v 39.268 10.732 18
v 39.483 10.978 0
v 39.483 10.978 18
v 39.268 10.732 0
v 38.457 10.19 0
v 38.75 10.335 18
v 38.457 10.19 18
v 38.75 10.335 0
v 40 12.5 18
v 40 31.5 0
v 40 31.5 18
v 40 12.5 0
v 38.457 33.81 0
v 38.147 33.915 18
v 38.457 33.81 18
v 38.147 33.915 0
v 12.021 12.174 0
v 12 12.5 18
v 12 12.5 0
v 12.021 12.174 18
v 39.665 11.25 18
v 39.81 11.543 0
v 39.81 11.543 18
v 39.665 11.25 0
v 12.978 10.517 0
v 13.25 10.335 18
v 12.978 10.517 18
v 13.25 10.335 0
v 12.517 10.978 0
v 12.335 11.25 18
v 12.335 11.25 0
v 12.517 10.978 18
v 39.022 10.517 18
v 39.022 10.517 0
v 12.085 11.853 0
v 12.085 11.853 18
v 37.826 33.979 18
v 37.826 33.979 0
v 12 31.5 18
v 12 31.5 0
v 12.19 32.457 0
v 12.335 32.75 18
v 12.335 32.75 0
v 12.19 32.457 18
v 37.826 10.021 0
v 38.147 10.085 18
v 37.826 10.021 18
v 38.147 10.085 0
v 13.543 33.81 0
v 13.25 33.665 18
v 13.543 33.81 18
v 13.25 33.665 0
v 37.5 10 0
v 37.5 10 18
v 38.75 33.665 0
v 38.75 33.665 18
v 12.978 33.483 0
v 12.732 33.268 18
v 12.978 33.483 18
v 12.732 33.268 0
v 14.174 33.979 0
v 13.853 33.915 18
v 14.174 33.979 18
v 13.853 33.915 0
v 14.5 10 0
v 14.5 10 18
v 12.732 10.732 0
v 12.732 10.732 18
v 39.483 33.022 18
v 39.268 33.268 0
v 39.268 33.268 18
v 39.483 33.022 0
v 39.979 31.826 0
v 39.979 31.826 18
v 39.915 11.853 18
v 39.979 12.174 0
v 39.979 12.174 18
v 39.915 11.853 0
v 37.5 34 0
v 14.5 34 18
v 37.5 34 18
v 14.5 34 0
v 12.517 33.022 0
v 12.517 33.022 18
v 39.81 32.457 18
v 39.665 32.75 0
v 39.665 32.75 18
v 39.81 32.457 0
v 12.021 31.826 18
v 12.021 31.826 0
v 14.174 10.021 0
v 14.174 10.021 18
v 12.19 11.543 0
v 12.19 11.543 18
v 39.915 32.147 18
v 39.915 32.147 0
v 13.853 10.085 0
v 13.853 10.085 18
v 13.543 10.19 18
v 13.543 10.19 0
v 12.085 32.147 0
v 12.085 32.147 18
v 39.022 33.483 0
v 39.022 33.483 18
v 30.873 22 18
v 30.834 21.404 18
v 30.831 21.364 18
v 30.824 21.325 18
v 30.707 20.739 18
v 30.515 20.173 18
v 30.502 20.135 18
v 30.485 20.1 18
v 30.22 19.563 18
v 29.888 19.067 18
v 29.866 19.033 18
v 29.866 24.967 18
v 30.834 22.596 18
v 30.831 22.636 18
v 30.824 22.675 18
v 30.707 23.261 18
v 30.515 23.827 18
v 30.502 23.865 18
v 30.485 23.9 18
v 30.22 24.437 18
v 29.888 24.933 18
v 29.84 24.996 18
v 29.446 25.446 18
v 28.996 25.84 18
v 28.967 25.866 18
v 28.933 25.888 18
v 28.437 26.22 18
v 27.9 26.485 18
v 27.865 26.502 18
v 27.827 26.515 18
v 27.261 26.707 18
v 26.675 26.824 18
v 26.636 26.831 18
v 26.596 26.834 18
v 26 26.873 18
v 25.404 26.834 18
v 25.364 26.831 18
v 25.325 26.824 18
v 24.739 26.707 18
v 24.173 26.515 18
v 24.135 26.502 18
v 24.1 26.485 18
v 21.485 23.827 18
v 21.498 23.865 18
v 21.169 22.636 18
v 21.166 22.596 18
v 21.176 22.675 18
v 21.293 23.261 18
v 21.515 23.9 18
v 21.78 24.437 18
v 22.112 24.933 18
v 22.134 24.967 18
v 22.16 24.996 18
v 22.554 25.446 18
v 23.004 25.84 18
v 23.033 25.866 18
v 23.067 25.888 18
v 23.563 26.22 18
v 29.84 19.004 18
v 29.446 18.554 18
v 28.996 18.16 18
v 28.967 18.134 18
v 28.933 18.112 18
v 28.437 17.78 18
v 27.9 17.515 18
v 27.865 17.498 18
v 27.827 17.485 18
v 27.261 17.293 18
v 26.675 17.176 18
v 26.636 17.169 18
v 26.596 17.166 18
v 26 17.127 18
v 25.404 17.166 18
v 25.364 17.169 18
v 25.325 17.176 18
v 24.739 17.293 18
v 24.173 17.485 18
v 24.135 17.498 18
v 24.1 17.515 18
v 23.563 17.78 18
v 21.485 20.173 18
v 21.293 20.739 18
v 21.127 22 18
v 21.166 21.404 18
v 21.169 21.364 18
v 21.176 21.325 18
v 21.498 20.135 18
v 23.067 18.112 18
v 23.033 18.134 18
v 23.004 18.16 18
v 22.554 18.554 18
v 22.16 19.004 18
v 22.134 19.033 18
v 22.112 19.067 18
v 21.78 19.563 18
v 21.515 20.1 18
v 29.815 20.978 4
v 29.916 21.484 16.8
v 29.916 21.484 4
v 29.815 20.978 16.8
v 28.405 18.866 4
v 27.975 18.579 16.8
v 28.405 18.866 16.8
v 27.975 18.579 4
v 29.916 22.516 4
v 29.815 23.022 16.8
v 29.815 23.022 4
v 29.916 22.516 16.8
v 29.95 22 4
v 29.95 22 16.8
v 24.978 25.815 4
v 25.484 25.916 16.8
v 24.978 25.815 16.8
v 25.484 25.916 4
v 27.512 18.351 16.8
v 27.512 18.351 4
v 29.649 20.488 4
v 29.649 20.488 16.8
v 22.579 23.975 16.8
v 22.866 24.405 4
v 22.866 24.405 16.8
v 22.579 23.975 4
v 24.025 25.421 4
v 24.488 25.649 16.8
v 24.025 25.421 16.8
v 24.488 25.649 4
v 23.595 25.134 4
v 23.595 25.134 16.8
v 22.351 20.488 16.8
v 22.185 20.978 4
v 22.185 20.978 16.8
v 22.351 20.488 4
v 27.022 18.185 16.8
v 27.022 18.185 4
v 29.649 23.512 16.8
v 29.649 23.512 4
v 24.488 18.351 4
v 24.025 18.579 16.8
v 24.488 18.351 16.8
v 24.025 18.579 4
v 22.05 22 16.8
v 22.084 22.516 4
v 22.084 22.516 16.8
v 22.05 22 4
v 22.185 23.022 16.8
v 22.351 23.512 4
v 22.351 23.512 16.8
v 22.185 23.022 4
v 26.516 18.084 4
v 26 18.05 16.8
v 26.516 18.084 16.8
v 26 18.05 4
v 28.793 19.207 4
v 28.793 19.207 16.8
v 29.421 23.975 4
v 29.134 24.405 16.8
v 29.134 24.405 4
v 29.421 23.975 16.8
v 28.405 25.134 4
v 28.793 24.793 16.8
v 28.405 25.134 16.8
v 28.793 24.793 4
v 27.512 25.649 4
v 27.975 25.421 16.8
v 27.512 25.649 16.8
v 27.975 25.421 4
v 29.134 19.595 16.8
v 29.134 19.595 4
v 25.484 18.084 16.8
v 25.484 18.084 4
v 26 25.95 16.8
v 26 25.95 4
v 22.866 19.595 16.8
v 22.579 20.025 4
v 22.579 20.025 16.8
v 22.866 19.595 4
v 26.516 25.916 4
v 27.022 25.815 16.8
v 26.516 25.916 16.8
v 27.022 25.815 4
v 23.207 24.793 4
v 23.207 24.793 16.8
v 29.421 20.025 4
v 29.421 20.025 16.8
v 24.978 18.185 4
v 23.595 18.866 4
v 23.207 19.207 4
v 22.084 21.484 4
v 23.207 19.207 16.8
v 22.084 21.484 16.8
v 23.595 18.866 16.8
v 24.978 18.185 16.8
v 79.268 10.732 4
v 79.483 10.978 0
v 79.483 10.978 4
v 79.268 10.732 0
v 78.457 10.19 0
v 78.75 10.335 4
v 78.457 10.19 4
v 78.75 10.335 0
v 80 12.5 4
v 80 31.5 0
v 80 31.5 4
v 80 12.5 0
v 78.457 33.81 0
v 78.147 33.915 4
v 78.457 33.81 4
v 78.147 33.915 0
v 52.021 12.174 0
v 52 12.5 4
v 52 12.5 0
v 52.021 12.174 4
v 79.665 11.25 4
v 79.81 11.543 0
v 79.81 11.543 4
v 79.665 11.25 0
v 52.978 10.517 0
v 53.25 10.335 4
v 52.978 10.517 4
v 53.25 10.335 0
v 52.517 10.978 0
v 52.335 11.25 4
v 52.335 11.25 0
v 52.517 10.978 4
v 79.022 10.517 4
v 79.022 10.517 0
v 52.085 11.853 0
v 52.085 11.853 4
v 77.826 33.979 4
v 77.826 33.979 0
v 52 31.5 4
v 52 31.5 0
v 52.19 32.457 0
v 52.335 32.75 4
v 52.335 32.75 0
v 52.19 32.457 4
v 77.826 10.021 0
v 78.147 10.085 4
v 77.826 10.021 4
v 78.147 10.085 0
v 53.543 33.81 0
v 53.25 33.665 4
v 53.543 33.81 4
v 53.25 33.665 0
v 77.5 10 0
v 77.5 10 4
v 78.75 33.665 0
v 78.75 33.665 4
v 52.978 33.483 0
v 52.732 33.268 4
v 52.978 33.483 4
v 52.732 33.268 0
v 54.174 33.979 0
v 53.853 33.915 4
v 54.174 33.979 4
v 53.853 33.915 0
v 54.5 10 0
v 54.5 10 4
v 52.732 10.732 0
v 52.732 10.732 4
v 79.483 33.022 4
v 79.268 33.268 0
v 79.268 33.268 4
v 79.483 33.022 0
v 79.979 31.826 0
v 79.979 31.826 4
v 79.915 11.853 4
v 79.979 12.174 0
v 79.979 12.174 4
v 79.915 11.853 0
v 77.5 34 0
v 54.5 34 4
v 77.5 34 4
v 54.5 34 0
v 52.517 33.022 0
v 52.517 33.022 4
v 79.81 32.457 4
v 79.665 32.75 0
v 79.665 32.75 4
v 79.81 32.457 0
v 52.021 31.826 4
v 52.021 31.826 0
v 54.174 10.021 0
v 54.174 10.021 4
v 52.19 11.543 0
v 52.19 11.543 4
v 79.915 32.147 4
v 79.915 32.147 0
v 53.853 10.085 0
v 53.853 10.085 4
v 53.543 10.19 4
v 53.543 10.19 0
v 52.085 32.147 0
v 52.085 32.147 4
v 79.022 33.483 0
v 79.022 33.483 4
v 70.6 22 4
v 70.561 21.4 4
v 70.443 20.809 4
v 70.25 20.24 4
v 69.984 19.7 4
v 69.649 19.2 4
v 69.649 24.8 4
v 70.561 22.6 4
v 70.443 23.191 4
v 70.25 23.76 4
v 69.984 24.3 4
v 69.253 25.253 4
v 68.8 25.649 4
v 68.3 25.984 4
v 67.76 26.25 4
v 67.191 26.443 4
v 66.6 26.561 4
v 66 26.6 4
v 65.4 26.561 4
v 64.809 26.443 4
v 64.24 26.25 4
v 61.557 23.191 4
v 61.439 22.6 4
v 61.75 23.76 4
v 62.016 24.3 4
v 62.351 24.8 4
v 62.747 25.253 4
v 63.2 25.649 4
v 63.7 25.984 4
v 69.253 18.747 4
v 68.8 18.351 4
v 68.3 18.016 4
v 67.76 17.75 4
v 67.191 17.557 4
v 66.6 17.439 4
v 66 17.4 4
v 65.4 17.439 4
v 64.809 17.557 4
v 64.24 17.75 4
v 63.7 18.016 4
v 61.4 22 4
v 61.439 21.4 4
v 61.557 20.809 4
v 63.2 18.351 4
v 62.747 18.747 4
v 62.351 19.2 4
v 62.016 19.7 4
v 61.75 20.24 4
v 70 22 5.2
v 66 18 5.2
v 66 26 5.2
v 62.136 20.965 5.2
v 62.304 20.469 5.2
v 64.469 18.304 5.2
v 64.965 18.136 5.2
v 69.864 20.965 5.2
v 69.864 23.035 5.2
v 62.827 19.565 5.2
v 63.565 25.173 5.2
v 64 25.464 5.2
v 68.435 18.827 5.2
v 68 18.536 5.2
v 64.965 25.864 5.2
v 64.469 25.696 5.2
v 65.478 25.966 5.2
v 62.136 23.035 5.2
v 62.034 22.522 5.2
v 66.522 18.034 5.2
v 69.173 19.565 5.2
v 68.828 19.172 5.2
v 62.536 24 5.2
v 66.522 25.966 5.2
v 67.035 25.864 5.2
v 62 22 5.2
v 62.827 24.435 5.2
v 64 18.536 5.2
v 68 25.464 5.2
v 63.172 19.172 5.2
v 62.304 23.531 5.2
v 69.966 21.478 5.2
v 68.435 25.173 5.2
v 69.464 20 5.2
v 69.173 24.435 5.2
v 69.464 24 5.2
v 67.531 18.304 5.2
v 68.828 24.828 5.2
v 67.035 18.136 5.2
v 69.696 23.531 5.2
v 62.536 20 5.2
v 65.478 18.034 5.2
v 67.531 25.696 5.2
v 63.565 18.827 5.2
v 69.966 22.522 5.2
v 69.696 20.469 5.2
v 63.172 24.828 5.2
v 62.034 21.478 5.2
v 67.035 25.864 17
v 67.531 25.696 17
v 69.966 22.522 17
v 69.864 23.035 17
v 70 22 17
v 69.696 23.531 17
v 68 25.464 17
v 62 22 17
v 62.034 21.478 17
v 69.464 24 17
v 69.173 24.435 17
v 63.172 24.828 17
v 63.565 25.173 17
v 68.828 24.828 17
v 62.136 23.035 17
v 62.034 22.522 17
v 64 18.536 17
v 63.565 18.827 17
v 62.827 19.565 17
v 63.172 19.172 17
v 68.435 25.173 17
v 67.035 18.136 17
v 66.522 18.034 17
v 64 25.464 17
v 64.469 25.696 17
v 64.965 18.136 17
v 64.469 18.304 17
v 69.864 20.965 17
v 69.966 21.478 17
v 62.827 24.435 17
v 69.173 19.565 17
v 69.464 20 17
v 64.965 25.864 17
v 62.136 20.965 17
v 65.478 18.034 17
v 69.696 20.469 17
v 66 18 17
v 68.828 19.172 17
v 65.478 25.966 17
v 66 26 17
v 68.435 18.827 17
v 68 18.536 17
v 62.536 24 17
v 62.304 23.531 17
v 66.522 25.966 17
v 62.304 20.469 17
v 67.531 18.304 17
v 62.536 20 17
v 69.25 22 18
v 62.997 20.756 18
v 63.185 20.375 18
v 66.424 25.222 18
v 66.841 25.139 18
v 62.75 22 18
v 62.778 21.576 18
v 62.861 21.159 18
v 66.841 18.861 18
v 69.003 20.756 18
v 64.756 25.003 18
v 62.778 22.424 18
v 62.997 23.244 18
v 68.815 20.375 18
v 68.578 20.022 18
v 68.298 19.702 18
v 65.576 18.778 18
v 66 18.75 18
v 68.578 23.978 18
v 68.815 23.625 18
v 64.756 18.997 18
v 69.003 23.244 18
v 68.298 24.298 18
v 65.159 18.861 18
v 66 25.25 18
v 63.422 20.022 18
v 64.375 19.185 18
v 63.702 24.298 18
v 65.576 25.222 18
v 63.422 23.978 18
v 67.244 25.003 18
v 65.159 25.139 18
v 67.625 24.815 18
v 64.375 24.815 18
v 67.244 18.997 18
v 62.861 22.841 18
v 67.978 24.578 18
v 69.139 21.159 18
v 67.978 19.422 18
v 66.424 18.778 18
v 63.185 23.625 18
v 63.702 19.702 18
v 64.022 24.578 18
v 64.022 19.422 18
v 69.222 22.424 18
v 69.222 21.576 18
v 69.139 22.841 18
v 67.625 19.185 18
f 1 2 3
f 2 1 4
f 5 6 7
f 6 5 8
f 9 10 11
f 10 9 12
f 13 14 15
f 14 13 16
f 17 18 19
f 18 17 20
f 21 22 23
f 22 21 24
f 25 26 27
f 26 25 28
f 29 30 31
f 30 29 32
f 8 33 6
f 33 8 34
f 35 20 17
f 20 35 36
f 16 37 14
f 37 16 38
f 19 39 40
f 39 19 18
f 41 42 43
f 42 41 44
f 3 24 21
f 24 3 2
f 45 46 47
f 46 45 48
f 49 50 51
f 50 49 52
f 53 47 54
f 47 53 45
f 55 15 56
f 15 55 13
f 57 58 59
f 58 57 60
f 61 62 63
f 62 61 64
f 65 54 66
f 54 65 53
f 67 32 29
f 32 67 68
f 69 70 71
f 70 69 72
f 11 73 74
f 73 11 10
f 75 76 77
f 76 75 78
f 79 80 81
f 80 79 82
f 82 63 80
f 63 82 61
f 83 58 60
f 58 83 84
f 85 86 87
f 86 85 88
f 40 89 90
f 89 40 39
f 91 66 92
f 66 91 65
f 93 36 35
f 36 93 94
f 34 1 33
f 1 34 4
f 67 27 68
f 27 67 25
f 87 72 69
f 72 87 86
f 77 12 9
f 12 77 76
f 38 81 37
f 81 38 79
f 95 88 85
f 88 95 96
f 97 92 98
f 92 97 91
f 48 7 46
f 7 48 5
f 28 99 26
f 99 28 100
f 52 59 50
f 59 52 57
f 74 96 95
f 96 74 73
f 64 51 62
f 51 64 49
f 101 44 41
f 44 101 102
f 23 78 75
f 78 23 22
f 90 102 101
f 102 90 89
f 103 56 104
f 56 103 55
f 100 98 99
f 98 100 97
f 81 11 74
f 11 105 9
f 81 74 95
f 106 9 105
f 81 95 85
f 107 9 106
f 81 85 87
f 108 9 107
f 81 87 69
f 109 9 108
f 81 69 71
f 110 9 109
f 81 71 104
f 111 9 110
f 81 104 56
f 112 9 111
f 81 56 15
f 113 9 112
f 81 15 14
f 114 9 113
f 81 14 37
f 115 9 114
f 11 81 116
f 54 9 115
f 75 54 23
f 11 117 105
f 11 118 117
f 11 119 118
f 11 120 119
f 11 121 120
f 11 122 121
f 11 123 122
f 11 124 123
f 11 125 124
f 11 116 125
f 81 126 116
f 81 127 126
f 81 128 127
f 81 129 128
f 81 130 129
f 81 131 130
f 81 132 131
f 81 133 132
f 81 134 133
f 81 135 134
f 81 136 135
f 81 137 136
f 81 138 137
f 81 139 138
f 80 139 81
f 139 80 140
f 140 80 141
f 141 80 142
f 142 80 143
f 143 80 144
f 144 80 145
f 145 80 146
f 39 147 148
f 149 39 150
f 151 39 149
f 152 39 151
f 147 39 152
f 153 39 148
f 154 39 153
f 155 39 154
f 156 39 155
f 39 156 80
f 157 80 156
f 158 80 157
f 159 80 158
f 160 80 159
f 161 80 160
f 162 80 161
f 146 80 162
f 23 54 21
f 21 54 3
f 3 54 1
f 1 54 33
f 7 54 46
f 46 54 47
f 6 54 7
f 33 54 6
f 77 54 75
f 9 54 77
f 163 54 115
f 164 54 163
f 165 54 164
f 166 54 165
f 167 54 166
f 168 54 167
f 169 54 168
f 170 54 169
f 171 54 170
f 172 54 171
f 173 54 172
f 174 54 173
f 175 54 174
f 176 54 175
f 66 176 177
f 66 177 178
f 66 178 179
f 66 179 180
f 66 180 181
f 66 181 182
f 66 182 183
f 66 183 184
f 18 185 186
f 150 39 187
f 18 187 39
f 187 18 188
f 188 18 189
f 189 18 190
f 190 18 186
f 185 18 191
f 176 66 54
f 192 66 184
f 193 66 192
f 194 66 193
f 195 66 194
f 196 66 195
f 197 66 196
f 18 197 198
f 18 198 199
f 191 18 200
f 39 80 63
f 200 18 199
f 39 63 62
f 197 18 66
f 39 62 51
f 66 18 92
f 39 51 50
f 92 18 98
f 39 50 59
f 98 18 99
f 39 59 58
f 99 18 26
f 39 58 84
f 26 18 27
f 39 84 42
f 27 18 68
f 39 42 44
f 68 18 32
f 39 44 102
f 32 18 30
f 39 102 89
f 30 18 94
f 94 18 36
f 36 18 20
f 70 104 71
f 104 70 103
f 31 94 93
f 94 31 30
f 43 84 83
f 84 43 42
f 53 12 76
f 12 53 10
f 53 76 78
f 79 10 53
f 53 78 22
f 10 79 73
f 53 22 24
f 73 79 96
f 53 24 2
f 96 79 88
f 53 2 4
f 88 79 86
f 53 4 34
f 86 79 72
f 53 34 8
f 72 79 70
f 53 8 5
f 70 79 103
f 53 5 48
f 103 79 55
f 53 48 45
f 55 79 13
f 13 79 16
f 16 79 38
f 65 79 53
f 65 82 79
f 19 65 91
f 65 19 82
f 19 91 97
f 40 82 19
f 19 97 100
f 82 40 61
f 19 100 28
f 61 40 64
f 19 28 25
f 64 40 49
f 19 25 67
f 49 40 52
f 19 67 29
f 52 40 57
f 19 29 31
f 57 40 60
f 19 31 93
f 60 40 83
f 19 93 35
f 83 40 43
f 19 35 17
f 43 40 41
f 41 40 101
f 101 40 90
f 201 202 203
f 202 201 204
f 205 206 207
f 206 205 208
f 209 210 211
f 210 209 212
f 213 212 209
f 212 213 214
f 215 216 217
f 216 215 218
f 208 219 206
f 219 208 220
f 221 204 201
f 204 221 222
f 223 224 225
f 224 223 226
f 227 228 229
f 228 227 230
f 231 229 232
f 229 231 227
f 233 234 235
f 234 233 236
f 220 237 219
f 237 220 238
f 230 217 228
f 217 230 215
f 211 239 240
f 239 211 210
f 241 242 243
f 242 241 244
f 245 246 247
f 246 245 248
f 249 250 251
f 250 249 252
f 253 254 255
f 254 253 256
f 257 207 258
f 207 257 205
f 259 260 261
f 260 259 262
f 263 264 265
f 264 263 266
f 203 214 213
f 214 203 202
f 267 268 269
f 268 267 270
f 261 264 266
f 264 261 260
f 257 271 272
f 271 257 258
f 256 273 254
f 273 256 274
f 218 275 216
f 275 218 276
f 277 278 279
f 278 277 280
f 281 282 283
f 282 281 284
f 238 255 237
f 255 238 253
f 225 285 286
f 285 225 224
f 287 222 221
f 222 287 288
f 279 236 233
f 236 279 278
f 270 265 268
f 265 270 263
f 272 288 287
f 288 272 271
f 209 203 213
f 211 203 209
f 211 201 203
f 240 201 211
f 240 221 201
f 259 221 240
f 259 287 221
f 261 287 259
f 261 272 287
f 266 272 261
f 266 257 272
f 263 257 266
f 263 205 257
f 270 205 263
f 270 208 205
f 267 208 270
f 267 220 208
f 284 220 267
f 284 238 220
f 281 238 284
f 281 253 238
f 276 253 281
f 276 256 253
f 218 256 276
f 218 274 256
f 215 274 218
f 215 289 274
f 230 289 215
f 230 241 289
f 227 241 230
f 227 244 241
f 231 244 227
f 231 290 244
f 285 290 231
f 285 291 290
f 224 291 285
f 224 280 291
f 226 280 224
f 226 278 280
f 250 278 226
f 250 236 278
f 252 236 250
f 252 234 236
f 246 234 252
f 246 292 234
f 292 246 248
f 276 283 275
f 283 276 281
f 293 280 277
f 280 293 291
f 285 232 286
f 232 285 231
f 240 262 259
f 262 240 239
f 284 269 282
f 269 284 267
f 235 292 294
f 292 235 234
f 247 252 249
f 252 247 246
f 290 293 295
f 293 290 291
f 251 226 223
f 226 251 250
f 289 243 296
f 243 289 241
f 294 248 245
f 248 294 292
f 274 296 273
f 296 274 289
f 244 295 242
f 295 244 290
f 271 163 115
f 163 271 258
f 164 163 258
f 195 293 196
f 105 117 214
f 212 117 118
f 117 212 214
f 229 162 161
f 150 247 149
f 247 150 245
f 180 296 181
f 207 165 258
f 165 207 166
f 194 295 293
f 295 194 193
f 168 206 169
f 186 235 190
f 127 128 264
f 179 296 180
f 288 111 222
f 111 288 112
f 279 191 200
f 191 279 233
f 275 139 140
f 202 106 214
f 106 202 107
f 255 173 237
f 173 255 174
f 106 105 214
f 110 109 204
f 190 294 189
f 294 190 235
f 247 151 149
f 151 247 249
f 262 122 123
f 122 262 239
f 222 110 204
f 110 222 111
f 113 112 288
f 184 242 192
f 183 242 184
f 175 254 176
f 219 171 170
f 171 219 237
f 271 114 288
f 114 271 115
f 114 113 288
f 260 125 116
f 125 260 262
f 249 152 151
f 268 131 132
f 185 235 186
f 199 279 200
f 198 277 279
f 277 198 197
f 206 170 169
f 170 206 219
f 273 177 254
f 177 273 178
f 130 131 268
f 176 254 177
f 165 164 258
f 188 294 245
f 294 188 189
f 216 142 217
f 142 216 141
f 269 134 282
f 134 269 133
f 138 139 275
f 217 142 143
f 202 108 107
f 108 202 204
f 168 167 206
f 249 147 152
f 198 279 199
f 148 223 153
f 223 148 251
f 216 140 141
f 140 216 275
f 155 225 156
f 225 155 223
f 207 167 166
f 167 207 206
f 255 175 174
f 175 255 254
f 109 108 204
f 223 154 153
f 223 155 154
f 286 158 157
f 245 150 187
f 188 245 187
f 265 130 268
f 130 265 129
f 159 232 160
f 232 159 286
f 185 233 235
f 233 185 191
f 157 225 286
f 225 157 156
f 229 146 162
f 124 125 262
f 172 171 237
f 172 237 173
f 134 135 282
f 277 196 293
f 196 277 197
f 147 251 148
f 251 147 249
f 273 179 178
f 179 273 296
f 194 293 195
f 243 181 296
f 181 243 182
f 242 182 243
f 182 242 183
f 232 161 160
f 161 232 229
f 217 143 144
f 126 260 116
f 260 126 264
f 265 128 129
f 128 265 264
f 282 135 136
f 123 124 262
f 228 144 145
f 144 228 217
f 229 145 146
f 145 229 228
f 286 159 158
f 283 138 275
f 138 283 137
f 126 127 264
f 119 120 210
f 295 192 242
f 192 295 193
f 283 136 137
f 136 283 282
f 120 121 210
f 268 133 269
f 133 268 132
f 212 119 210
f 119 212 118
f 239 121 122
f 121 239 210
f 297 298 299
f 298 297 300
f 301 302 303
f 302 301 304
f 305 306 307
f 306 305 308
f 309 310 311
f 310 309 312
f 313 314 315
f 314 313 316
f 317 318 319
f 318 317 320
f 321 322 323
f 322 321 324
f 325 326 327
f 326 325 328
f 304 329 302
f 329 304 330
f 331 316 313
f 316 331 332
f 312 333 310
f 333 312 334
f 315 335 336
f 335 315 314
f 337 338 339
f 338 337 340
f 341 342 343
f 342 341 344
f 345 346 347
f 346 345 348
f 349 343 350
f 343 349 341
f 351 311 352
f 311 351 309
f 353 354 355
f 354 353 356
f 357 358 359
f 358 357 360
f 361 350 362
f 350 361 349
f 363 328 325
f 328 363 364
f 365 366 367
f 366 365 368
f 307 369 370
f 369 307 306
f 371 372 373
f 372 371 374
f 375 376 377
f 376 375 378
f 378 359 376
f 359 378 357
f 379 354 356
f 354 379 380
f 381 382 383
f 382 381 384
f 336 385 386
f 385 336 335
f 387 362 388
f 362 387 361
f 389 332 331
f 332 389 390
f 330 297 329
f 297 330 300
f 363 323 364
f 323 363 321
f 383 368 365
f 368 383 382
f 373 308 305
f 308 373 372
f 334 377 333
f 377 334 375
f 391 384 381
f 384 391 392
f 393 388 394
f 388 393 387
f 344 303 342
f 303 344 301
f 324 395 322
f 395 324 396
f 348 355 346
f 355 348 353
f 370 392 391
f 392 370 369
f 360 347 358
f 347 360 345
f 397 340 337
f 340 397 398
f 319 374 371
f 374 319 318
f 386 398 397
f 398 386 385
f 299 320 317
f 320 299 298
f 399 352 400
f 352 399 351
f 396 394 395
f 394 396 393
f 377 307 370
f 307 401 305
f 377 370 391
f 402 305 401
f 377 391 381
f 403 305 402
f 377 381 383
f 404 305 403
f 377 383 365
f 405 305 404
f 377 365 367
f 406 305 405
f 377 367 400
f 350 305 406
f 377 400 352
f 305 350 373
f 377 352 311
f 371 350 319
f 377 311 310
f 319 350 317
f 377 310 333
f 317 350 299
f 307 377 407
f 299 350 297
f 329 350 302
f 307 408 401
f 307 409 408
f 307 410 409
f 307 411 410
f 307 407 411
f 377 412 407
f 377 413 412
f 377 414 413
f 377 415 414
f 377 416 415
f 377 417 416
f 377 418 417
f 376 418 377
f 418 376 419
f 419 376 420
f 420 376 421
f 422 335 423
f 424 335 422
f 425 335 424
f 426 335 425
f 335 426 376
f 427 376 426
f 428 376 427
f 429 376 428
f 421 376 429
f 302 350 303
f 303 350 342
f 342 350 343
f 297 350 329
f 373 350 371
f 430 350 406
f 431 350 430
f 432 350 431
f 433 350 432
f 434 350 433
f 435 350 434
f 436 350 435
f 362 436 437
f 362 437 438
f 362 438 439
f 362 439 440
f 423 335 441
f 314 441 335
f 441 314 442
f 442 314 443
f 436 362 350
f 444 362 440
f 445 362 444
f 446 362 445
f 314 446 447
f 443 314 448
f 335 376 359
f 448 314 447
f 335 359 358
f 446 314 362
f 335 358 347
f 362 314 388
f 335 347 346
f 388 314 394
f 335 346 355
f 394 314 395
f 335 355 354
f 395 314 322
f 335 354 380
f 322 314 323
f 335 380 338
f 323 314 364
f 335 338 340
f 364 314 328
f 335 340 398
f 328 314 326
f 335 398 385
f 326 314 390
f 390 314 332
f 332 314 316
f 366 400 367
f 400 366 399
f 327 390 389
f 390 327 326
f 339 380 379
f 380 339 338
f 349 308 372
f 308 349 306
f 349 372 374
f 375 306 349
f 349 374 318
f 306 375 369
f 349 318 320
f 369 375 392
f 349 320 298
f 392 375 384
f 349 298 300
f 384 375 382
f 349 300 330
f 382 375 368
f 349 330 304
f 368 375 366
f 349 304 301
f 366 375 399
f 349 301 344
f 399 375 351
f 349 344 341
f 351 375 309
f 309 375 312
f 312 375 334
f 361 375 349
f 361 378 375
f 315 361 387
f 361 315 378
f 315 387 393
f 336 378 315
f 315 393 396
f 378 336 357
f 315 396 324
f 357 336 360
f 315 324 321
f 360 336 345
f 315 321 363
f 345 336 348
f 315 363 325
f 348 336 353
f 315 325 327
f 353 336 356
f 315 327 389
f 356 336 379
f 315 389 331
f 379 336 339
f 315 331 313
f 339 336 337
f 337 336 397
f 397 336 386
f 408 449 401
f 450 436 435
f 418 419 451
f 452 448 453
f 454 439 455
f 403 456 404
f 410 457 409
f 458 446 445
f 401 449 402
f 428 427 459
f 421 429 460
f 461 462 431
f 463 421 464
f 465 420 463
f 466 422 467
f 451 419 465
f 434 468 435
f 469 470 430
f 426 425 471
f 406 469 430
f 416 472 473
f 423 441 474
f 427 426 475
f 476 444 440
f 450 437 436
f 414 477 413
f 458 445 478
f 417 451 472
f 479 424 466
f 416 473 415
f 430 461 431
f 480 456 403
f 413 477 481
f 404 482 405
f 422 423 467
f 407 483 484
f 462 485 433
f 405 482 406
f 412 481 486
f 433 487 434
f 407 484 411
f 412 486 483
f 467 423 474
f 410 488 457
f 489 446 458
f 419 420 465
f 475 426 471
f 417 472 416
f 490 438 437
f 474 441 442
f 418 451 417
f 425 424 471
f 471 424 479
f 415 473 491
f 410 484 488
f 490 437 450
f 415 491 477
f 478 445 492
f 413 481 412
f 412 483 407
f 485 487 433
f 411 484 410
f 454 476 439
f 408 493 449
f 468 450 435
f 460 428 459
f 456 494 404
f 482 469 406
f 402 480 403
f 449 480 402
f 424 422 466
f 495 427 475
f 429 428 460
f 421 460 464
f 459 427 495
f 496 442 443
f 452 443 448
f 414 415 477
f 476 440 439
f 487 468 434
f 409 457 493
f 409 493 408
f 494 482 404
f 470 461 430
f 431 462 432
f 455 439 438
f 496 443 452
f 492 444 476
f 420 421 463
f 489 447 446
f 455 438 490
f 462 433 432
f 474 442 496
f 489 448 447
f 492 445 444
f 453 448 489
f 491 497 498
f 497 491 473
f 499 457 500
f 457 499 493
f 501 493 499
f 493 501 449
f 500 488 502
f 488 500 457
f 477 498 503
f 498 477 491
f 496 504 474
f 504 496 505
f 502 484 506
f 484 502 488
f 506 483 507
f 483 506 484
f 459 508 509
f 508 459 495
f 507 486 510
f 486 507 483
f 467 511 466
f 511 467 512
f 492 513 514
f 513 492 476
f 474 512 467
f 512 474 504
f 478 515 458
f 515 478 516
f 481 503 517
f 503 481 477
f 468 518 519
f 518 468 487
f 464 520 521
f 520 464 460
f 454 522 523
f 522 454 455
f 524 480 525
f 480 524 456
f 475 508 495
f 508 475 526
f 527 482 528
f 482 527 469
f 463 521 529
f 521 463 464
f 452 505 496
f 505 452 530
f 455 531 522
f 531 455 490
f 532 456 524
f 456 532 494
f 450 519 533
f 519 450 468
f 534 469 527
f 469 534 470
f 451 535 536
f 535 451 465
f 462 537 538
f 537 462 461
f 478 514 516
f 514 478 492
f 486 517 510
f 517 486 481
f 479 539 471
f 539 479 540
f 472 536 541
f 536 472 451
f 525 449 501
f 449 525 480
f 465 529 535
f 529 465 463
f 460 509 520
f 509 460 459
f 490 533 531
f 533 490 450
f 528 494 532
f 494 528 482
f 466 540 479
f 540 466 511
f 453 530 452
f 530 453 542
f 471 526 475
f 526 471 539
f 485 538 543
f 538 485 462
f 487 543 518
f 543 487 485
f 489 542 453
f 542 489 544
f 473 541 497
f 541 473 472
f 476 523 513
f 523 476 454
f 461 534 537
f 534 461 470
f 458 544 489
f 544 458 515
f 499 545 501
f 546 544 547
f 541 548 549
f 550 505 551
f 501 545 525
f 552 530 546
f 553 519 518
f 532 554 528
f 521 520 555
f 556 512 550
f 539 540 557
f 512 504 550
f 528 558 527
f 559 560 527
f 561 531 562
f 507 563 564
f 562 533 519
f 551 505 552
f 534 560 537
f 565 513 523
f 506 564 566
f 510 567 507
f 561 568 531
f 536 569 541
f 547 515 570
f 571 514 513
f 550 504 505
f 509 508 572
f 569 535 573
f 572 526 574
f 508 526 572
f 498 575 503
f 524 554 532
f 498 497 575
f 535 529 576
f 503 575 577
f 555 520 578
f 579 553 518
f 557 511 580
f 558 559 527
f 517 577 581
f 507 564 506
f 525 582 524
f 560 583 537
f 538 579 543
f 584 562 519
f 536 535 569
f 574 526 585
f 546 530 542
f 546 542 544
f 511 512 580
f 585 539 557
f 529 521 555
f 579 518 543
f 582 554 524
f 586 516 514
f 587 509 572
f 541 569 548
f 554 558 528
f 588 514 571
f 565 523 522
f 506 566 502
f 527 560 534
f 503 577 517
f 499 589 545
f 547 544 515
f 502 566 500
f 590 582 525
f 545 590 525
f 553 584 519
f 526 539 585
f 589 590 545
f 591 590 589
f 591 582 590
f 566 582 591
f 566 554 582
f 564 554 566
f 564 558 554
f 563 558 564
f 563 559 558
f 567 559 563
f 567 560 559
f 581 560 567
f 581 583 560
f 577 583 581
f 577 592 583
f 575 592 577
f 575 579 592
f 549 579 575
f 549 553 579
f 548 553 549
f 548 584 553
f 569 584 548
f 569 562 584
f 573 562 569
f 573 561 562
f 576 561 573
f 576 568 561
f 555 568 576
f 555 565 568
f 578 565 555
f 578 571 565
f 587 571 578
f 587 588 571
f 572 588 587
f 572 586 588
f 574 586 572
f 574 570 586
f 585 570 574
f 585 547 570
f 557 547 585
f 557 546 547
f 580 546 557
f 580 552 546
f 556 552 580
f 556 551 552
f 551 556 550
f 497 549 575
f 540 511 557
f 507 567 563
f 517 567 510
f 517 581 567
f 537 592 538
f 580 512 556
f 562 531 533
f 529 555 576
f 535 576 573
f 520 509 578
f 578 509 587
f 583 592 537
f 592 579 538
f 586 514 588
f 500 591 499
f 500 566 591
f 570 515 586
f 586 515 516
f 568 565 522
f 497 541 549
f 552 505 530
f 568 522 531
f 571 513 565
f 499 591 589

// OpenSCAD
/*
Sample 038: Dauerhafter Pressstift — 0,05 mm Übermaß
Generated from the FDM Mechanical Sample Library.
Units: millimetres.

Override examples:
  openscad -o custom.stl -D 'view="plate"' -D 'render_fn=64' model.scad
  openscad -o preview.png -D 'view="assembly"' model.scad
*/
use <../../../library/fdm_mechanisms.scad>

render_fn = is_undef(render_fn) ? 48 : render_fn;
view = is_undef(view) ? "plate" : view;
$fn = render_fn;

sample_pressfit_dowel(
    view=view,
    pin_d=8,
    gap=-0.05
);
